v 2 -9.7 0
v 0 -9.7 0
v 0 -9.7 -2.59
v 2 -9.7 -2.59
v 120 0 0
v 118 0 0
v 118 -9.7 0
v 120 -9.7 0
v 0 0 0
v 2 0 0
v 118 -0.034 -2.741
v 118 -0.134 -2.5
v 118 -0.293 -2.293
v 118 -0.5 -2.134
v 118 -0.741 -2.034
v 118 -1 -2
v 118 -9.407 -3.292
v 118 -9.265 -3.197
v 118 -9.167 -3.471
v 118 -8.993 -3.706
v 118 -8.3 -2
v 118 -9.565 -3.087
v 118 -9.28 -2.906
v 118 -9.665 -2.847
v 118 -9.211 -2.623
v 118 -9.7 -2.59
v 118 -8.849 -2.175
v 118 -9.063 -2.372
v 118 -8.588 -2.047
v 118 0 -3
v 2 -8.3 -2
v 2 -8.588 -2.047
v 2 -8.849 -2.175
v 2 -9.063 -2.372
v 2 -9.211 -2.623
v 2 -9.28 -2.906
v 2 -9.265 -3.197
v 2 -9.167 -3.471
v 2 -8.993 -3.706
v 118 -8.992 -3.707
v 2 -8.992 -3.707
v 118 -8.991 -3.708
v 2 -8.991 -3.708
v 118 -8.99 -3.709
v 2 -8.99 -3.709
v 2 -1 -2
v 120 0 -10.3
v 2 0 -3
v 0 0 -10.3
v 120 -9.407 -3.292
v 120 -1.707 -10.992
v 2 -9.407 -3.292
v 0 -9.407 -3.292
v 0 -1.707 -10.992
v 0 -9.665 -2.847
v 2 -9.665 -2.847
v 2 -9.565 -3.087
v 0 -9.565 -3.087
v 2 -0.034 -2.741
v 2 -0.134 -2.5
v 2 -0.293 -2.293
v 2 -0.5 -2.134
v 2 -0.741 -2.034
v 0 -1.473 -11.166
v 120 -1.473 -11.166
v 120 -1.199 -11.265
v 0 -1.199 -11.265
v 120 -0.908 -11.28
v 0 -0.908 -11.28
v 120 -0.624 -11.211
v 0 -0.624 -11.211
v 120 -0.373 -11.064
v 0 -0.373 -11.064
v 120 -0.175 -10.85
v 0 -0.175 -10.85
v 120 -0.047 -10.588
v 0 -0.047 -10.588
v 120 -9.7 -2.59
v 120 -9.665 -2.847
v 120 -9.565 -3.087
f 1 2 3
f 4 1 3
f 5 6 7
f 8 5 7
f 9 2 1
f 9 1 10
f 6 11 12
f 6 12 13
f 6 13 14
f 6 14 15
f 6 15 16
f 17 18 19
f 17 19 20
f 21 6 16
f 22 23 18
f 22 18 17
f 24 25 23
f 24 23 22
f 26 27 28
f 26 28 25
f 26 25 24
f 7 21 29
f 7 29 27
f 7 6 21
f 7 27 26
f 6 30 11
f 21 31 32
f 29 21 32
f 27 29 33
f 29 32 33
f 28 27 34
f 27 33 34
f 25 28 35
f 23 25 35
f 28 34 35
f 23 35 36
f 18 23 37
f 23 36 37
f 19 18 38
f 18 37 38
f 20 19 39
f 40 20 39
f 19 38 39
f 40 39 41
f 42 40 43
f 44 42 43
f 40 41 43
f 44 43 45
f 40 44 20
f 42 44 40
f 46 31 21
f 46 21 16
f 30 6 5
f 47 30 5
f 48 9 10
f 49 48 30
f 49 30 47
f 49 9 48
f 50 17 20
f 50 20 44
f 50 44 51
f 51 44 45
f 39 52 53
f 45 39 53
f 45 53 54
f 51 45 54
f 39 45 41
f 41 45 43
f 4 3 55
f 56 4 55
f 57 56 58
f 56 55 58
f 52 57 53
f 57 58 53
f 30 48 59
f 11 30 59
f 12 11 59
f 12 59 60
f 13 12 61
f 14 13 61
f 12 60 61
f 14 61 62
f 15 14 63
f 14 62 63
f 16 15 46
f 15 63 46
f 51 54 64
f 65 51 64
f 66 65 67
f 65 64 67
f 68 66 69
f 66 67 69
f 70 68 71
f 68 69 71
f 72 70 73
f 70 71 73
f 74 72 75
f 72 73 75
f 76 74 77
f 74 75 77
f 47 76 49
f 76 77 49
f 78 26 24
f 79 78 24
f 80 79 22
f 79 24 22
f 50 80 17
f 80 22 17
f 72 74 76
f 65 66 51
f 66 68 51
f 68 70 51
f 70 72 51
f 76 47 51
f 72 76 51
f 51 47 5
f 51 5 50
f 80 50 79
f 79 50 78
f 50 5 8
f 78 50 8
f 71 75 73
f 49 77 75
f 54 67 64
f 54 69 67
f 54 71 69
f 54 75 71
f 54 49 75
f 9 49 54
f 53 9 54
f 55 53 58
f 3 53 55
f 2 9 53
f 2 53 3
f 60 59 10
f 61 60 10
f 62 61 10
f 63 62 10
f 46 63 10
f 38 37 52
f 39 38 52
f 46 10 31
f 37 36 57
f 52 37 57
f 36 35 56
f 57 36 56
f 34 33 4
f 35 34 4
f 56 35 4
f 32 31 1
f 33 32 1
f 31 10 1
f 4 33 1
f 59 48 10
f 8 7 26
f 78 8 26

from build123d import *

# Parameters (mm, degrees)
PAD_DEPTH    = 2
PAD001_DEPTH = 116
PAD002_DEPTH = 2


with BuildPart() as part:
    # Sketch → Pad (new body)
    with BuildSketch(Plane.YZ):
        with BuildLine():
            Line((-9.7, 0), (0, 0))
            Line((0, 0), (0, -10.3))
            ThreePointArc((-1.707, -10.992), (-0.624263, -11.211473), (0, -10.3))
            Line((-9.406686, -3.292314), (-1.707, -10.992))
            ThreePointArc((-9.7, -2.59), (-9.62277, -2.970153), (-9.406686, -3.292314))
            Line((-9.7, 0), (-9.7, -2.59))
        make_face()
    extrude(amount=PAD_DEPTH)

    # Sketch001 (on Face8 of Pad) → Pad001 (join)
    with BuildSketch(Plane.YZ.offset(2)):
        with BuildLine():
            Line((0, -3), (0, -10.3))
            ThreePointArc((-1.707, -10.992), (-0.624263, -11.211473), (0, -10.3))
            Line((-8.9902, -3.7088), (-1.707, -10.992))
            ThreePointArc((-8.3, -2), (-9.211954, -2.625443), (-8.9902, -3.7088))
            Line((-8.3, -2), (-1, -2))
            ThreePointArc((0, -3), (-0.292893, -2.292893), (-1, -2))
        make_face()
    extrude(amount=PAD001_DEPTH)

    # Sketch002 (on Face9 of Pad001) → Pad002 (join)
    with BuildSketch(Plane.YZ.offset(118)):
        with BuildLine():
            Line((0, 0), (0, -10.3))
            ThreePointArc((-1.707, -10.992), (-0.624263, -11.211473), (0, -10.3))
            Line((-9.406686, -3.292314), (-1.707, -10.992))
            ThreePointArc((-9.7, -2.59), (-9.62277, -2.970153), (-9.406686, -3.292314))
            Line((-9.7, 0), (-9.7, -2.59))
            Line((0, 0), (-9.7, 0))
        make_face()
    extrude(amount=PAD002_DEPTH)


solid = part.part
